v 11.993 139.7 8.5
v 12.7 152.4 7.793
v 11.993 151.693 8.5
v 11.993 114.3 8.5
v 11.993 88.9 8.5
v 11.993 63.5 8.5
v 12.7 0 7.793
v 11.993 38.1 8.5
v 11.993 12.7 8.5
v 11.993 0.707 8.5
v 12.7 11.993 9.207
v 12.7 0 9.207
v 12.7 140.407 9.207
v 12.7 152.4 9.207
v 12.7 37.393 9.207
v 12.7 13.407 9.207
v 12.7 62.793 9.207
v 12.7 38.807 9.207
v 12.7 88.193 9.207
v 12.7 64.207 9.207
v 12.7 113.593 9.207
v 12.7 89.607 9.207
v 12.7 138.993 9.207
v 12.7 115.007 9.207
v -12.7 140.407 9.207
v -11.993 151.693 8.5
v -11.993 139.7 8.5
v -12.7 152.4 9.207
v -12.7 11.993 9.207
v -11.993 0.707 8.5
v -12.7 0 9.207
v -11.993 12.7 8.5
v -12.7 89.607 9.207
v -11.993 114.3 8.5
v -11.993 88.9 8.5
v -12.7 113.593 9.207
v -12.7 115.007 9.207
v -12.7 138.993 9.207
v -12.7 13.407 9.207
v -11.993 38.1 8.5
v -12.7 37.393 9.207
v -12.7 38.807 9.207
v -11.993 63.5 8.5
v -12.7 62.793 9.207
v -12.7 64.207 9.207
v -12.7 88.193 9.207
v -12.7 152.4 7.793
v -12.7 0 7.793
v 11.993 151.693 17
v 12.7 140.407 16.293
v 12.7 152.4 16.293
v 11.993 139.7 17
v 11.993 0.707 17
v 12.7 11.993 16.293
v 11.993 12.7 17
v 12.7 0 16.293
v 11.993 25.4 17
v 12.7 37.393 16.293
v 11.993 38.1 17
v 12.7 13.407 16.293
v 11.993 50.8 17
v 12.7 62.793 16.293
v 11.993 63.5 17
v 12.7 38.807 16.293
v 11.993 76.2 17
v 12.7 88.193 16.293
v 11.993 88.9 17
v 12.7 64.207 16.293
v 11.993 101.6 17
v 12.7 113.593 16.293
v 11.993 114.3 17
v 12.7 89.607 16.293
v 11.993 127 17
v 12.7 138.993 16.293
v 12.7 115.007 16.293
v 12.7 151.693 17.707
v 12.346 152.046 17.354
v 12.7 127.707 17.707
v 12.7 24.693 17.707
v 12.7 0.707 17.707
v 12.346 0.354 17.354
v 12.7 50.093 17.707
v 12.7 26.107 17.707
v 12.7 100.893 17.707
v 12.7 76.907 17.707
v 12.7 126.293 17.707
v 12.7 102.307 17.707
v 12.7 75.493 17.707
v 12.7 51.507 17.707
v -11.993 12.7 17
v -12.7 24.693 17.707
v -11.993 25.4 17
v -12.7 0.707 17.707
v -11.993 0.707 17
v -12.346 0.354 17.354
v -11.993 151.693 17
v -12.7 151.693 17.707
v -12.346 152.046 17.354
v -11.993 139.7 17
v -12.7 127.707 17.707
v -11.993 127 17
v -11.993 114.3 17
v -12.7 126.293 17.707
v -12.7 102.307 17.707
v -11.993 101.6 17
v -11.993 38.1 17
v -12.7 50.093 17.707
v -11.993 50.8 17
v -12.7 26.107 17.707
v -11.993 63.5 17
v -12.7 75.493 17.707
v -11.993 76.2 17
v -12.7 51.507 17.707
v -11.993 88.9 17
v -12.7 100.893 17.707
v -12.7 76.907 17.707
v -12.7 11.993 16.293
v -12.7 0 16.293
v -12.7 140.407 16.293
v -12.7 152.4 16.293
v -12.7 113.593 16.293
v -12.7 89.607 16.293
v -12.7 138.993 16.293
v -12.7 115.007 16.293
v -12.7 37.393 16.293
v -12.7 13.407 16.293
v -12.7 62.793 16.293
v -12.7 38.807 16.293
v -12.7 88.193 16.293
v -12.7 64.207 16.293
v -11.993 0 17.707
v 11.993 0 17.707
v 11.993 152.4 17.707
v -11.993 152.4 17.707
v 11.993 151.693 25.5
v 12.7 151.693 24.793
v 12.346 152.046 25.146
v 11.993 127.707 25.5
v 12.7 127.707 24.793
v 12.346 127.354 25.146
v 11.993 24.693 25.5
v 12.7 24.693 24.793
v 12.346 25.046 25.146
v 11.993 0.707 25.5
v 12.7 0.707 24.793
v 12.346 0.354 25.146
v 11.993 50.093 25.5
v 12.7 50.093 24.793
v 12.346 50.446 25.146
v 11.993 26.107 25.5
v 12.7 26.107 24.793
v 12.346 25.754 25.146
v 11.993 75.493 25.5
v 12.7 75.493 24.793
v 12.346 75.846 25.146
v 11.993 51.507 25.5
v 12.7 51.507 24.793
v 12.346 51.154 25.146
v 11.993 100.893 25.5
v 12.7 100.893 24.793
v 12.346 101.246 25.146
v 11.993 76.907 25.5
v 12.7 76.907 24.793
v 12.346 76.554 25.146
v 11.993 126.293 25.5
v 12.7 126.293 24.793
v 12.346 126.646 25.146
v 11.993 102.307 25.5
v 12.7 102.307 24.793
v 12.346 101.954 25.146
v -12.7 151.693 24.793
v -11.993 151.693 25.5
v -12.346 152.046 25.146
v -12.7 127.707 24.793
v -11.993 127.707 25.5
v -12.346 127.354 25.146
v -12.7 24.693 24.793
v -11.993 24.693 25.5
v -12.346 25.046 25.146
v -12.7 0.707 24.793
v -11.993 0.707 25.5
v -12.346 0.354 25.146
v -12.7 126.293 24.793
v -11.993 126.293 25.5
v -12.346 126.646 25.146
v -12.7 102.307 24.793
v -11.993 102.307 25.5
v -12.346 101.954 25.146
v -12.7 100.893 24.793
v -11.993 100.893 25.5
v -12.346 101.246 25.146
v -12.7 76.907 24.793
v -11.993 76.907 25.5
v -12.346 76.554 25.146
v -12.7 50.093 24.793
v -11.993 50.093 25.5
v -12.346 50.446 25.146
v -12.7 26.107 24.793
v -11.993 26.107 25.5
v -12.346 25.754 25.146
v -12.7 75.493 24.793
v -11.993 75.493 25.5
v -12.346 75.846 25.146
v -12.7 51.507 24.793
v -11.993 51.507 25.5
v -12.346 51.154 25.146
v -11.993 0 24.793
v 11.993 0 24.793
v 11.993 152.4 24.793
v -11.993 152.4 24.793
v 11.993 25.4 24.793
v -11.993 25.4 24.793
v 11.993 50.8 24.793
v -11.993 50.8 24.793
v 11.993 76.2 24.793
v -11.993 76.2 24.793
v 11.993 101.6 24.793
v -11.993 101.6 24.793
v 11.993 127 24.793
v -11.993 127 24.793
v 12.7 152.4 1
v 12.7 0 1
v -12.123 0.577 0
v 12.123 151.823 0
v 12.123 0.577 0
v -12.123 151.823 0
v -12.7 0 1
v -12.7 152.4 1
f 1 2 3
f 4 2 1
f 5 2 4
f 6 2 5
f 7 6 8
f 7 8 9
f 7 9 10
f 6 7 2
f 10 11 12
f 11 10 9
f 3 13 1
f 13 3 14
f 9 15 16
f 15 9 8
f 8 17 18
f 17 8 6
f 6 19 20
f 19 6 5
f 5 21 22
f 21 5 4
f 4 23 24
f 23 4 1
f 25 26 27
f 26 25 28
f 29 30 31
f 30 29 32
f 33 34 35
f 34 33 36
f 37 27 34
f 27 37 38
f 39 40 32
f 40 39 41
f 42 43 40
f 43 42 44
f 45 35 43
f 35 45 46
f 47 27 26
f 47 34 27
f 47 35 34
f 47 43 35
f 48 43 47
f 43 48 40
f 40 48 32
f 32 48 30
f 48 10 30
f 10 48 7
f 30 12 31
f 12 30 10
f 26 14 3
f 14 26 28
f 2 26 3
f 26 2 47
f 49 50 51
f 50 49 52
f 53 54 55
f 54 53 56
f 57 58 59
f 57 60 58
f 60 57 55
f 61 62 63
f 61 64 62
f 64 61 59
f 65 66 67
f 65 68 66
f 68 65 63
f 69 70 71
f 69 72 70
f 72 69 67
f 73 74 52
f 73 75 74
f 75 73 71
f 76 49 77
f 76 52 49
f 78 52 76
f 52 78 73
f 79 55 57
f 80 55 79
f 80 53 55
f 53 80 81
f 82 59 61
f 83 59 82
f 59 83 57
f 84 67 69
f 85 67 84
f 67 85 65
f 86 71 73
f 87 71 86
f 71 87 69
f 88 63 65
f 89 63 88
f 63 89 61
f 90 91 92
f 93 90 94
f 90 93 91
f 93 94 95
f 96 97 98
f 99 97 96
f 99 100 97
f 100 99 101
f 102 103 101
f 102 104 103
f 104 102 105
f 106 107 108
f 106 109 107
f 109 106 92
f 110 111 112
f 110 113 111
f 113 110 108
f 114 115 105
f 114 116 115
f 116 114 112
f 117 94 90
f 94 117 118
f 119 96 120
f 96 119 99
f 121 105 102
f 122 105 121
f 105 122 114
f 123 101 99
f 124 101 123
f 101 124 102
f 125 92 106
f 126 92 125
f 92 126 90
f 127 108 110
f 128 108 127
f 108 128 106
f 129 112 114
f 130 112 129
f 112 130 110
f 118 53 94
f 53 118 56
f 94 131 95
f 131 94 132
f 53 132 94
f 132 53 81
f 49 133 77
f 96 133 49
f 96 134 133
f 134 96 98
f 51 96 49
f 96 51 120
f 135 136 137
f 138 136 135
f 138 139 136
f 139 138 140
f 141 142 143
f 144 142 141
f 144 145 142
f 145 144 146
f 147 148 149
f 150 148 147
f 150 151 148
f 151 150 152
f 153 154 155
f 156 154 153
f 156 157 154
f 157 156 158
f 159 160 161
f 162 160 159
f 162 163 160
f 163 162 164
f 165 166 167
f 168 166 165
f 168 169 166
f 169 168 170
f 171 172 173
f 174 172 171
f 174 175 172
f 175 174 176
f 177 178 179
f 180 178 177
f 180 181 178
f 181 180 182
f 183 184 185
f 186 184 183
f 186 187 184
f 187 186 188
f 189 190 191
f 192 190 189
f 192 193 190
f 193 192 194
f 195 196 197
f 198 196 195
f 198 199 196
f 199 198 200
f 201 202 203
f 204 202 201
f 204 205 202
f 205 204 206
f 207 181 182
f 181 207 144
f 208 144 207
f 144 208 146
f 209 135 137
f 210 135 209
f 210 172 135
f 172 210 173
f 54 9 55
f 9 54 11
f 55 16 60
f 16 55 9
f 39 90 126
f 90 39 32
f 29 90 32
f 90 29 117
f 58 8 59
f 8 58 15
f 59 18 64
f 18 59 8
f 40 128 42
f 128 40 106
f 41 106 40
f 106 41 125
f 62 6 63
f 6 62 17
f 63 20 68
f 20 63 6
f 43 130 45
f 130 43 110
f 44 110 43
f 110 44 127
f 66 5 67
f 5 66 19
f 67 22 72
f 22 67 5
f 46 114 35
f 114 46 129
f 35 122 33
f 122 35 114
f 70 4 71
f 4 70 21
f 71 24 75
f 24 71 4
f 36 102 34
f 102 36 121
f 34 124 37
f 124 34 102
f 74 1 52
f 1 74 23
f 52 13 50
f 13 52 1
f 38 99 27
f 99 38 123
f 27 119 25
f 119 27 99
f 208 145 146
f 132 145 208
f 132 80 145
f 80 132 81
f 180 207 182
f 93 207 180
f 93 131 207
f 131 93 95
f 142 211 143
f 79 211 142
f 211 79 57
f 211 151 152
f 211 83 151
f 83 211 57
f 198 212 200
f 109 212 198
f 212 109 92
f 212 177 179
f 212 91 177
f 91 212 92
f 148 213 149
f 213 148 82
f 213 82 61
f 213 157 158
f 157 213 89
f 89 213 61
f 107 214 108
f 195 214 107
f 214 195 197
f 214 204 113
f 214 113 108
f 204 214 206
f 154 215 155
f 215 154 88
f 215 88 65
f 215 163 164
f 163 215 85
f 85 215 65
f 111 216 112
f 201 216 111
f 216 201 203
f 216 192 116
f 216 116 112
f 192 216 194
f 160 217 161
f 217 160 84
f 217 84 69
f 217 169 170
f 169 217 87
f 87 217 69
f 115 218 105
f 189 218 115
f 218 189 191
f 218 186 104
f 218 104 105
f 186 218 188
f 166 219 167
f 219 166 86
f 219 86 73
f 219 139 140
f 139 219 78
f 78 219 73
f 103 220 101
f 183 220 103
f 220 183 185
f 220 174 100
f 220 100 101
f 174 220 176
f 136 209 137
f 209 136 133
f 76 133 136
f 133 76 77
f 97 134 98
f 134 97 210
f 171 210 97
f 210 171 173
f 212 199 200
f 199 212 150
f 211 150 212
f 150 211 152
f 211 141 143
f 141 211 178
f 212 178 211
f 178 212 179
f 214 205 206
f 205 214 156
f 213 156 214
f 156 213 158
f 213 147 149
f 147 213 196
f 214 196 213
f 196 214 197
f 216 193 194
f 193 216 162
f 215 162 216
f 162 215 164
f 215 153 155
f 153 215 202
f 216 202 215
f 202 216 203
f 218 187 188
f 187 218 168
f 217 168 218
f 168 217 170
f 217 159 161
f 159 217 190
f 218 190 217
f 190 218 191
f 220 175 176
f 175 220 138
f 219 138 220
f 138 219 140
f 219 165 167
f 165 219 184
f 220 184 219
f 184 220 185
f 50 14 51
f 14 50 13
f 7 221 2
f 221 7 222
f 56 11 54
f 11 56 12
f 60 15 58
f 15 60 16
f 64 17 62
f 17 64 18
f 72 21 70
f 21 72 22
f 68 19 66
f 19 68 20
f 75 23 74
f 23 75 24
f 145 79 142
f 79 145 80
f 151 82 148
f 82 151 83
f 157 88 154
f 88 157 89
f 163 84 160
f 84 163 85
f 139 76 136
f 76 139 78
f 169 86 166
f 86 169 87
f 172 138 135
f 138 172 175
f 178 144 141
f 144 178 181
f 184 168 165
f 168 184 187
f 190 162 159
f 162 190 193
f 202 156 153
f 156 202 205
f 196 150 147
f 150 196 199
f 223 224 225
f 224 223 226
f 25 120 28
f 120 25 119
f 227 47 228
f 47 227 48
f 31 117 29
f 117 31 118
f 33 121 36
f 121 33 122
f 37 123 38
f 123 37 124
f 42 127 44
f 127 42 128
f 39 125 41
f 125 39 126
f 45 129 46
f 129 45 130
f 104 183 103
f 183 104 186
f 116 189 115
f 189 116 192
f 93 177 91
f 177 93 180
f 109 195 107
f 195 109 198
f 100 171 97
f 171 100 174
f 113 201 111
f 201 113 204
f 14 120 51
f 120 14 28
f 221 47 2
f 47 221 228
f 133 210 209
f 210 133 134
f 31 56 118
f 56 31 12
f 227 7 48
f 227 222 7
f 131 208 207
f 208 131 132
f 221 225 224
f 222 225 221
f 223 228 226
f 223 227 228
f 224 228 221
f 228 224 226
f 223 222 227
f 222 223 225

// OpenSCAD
thickness=8.5;
tilex=1;
tiley=6;
inch=25.4;
groove=1;


//wall
    difference()
    {
        translate([0,tiley*inch/2,thickness*1.5])cube([inch,tiley*inch,thickness*3],center=true);
        
        pocks=floor(rands(0,(tiley)*1,1)[0]);
        //pocks=0;
        //echo (pocks);
        for (ii=[0:pocks])
        {
            shapenum = floor(rands(0,16,1)[0])+1;
            echo(shapenum);
            angle=floor(rands(0,360,1)[0])+1;
            xx=-1*(thickness*2+inch/2)+((thickness*4+inch))*(rands(0,1,1)[0]); //total area is the top (inch/2) and the wall (2 thicknesses)
            yy=inch*(rands(0,tiley,1)[0]);
            zz1=(inch/2+thickness*3)-xx;  //pivot is going to be the total area, minus how far we've gone so far (xx)
            zz2=xx+(inch/2+thickness*3);
            translate([xx,yy,thickness*3])rotate([0,0,angle])blemish(shapenum);
            translate([inch/2,yy,zz1])rotate([0,90,0])rotate([0,0,angle])blemish(shapenum);
            translate([-inch/2,yy,zz2])rotate([0,-90,0])rotate([0,0,angle])blemish(shapenum);
        }
        for (ii=[0:2])//horizontal lines
        {
            translate([inch/2,tiley*inch/2,thickness*1+(ii*thickness)])rotate([0,45,0])cube([groove,tiley*inch*2,groove],center=true);
            
            translate([-inch/2,tiley*inch/2,thickness*1+(ii*thickness)])rotate([0,45,0])cube([groove,tiley*inch*2,groove],center=true);
            translate([0,0,thickness*1+(ii*thickness)])rotate([45,0,0])cube([inch*2,groove,groove],center=true);
            translate([0,inch*tiley,thickness*1+(ii*thickness)])rotate([45,0,0])cube([inch*2,groove,groove],center=true);
        }
        for (ii=[0:tiley])
            //middle row
        {
            translate([inch/2,inch*ii+inch/2,thickness+thickness*.5])rotate([0,0,45])cube([groove,groove,thickness],center=true);
            translate([-inch/2,inch*ii+inch/2,thickness+thickness*.5])rotate([0,0,45])cube([groove,groove,thickness],center=true);
        }
        for (ii=[0:tiley])
        {
            //top row
            translate([inch/2,inch*ii,thickness*2+thickness*.5])rotate([0,0,45])cube([groove,groove,thickness],center=true);
            translate([-inch/2,inch*ii,thickness*2+thickness*.5])rotate([0,0,45])cube([groove,groove,thickness],center=true);
        }
        for (ii=[0:tiley])
        {
            //top grooves
            translate([0,inch*ii,thickness*3])rotate([45,0,0])cube([inch*2,groove,groove],center=true);
        }

        translate([inch/2,tiley*inch/2,0])rotate([0,30,0])cube([groove,tiley*inch*2,groove*2],center=true);
        translate([-inch/2,tiley*inch/2,0])rotate([0,60,0])cube([groove*2,tiley*inch*2,groove],center=true);
        translate([tilex*inch/2,tiley*inch,0])rotate([60,0,0])cube([tilex*inch*2,groove*2,groove],center=true);
        translate([tilex*inch/2,0,0])rotate([30,0,0])cube([tilex*inch*2,groove,groove*2],center=true);
        
    }

module selectshape(shapenum)
{
    
    if (shapenum==1){ shape01(); }
    if (shapenum==2){ shape02(); }
    if (shapenum==3){ shape03(); }
    if (shapenum==4){ shape04(); }
    if (shapenum==5){ shape05(); }
    if (shapenum==6){ shape06(); }
    if (shapenum==7){ shape07(); }
    if (shapenum==8){ shape08(); }
    if (shapenum==9){ shape09(); }
    if (shapenum==10){ shape10(); }
    if (shapenum==11){ shape11(); }
    if (shapenum==12){ shape12(); }
    if (shapenum==13){ shape13(); }
    if (shapenum==14){ shape14(); }
    if (shapenum==15){ shape15(); }
    if (shapenum==16){ shape16(); }
}
module blemish(shapenum)
{
    
    {
        translate([0,0,-.5])linear_extrude(height=.101)selectshape(shapenum);
        translate([0,0,-.4])linear_extrude(height=.101)minkowski(){selectshape(shapenum); circle(r=.1);}
        translate([0,0,-.3])linear_extrude(height=.101)minkowski(){selectshape(shapenum); circle(r=.2);}
        translate([0,0,-.2])linear_extrude(height=.101)minkowski(){selectshape(shapenum); circle(r=.3);}
        translate([0,0,-.1])linear_extrude(height=.101)minkowski(){selectshape(shapenum); circle(r=.4);}
    }
}
module shape01()
{
    translate([-3,-2])scale(.8)import("blemish/shape001.dxf");
}
module shape02()
{
    translate([-3,-2])scale(.8)import("blemish/shape002.dxf");
}
module shape03()
{
    translate([-3,-2,0])scale(.8)import("blemish/shape003.dxf");
}
module shape04()
{
    translate([-14,-18,0])scale(.8)import("blemish/shape004.dxf");
}
module shape05()
{
    translate([-13,-10,0])scale(.8)import("blemish/shape005.dxf");
}
module shape06()
{
    translate([-2,-4,0])scale(.32)import("blemish/shape006.dxf");
}
module shape07()
{
    translate([-9,-9,0])scale(.3)import("blemish/shape007.dxf");
}
module shape08()
{
    translate([-6,-12,0])scale(.6)import("blemish/shape008.dxf");
}
module shape09()
{
    translate([-2,-2,0])scale(.2)import("blemish/shape009.dxf");
}
module shape10()
{
    translate([-1,-3,0])scale(.1)import("blemish/shape010.dxf");
}
module shape11()
{
    translate([-2,-4,0])scale(.3)import("blemish/shape011.dxf");
}
module shape12()
{
    translate([-6,-2,0])scale(.6)import("blemish/shape012.dxf");
}
module shape13()
{
    translate([-9,-14,0])scale(.7)import("blemish/shape013.dxf");
}
module shape14()
{
    translate([-0.5,-1,0])scale(.1)import("blemish/shape014.dxf");
}
module shape15()
{
    translate([-.5,-.5,0])scale(.1)import("blemish/shape015.dxf");
}
module shape16()
{
    translate([-6,-6,0])scale(.5)import("blemish/shape016.dxf");
}
